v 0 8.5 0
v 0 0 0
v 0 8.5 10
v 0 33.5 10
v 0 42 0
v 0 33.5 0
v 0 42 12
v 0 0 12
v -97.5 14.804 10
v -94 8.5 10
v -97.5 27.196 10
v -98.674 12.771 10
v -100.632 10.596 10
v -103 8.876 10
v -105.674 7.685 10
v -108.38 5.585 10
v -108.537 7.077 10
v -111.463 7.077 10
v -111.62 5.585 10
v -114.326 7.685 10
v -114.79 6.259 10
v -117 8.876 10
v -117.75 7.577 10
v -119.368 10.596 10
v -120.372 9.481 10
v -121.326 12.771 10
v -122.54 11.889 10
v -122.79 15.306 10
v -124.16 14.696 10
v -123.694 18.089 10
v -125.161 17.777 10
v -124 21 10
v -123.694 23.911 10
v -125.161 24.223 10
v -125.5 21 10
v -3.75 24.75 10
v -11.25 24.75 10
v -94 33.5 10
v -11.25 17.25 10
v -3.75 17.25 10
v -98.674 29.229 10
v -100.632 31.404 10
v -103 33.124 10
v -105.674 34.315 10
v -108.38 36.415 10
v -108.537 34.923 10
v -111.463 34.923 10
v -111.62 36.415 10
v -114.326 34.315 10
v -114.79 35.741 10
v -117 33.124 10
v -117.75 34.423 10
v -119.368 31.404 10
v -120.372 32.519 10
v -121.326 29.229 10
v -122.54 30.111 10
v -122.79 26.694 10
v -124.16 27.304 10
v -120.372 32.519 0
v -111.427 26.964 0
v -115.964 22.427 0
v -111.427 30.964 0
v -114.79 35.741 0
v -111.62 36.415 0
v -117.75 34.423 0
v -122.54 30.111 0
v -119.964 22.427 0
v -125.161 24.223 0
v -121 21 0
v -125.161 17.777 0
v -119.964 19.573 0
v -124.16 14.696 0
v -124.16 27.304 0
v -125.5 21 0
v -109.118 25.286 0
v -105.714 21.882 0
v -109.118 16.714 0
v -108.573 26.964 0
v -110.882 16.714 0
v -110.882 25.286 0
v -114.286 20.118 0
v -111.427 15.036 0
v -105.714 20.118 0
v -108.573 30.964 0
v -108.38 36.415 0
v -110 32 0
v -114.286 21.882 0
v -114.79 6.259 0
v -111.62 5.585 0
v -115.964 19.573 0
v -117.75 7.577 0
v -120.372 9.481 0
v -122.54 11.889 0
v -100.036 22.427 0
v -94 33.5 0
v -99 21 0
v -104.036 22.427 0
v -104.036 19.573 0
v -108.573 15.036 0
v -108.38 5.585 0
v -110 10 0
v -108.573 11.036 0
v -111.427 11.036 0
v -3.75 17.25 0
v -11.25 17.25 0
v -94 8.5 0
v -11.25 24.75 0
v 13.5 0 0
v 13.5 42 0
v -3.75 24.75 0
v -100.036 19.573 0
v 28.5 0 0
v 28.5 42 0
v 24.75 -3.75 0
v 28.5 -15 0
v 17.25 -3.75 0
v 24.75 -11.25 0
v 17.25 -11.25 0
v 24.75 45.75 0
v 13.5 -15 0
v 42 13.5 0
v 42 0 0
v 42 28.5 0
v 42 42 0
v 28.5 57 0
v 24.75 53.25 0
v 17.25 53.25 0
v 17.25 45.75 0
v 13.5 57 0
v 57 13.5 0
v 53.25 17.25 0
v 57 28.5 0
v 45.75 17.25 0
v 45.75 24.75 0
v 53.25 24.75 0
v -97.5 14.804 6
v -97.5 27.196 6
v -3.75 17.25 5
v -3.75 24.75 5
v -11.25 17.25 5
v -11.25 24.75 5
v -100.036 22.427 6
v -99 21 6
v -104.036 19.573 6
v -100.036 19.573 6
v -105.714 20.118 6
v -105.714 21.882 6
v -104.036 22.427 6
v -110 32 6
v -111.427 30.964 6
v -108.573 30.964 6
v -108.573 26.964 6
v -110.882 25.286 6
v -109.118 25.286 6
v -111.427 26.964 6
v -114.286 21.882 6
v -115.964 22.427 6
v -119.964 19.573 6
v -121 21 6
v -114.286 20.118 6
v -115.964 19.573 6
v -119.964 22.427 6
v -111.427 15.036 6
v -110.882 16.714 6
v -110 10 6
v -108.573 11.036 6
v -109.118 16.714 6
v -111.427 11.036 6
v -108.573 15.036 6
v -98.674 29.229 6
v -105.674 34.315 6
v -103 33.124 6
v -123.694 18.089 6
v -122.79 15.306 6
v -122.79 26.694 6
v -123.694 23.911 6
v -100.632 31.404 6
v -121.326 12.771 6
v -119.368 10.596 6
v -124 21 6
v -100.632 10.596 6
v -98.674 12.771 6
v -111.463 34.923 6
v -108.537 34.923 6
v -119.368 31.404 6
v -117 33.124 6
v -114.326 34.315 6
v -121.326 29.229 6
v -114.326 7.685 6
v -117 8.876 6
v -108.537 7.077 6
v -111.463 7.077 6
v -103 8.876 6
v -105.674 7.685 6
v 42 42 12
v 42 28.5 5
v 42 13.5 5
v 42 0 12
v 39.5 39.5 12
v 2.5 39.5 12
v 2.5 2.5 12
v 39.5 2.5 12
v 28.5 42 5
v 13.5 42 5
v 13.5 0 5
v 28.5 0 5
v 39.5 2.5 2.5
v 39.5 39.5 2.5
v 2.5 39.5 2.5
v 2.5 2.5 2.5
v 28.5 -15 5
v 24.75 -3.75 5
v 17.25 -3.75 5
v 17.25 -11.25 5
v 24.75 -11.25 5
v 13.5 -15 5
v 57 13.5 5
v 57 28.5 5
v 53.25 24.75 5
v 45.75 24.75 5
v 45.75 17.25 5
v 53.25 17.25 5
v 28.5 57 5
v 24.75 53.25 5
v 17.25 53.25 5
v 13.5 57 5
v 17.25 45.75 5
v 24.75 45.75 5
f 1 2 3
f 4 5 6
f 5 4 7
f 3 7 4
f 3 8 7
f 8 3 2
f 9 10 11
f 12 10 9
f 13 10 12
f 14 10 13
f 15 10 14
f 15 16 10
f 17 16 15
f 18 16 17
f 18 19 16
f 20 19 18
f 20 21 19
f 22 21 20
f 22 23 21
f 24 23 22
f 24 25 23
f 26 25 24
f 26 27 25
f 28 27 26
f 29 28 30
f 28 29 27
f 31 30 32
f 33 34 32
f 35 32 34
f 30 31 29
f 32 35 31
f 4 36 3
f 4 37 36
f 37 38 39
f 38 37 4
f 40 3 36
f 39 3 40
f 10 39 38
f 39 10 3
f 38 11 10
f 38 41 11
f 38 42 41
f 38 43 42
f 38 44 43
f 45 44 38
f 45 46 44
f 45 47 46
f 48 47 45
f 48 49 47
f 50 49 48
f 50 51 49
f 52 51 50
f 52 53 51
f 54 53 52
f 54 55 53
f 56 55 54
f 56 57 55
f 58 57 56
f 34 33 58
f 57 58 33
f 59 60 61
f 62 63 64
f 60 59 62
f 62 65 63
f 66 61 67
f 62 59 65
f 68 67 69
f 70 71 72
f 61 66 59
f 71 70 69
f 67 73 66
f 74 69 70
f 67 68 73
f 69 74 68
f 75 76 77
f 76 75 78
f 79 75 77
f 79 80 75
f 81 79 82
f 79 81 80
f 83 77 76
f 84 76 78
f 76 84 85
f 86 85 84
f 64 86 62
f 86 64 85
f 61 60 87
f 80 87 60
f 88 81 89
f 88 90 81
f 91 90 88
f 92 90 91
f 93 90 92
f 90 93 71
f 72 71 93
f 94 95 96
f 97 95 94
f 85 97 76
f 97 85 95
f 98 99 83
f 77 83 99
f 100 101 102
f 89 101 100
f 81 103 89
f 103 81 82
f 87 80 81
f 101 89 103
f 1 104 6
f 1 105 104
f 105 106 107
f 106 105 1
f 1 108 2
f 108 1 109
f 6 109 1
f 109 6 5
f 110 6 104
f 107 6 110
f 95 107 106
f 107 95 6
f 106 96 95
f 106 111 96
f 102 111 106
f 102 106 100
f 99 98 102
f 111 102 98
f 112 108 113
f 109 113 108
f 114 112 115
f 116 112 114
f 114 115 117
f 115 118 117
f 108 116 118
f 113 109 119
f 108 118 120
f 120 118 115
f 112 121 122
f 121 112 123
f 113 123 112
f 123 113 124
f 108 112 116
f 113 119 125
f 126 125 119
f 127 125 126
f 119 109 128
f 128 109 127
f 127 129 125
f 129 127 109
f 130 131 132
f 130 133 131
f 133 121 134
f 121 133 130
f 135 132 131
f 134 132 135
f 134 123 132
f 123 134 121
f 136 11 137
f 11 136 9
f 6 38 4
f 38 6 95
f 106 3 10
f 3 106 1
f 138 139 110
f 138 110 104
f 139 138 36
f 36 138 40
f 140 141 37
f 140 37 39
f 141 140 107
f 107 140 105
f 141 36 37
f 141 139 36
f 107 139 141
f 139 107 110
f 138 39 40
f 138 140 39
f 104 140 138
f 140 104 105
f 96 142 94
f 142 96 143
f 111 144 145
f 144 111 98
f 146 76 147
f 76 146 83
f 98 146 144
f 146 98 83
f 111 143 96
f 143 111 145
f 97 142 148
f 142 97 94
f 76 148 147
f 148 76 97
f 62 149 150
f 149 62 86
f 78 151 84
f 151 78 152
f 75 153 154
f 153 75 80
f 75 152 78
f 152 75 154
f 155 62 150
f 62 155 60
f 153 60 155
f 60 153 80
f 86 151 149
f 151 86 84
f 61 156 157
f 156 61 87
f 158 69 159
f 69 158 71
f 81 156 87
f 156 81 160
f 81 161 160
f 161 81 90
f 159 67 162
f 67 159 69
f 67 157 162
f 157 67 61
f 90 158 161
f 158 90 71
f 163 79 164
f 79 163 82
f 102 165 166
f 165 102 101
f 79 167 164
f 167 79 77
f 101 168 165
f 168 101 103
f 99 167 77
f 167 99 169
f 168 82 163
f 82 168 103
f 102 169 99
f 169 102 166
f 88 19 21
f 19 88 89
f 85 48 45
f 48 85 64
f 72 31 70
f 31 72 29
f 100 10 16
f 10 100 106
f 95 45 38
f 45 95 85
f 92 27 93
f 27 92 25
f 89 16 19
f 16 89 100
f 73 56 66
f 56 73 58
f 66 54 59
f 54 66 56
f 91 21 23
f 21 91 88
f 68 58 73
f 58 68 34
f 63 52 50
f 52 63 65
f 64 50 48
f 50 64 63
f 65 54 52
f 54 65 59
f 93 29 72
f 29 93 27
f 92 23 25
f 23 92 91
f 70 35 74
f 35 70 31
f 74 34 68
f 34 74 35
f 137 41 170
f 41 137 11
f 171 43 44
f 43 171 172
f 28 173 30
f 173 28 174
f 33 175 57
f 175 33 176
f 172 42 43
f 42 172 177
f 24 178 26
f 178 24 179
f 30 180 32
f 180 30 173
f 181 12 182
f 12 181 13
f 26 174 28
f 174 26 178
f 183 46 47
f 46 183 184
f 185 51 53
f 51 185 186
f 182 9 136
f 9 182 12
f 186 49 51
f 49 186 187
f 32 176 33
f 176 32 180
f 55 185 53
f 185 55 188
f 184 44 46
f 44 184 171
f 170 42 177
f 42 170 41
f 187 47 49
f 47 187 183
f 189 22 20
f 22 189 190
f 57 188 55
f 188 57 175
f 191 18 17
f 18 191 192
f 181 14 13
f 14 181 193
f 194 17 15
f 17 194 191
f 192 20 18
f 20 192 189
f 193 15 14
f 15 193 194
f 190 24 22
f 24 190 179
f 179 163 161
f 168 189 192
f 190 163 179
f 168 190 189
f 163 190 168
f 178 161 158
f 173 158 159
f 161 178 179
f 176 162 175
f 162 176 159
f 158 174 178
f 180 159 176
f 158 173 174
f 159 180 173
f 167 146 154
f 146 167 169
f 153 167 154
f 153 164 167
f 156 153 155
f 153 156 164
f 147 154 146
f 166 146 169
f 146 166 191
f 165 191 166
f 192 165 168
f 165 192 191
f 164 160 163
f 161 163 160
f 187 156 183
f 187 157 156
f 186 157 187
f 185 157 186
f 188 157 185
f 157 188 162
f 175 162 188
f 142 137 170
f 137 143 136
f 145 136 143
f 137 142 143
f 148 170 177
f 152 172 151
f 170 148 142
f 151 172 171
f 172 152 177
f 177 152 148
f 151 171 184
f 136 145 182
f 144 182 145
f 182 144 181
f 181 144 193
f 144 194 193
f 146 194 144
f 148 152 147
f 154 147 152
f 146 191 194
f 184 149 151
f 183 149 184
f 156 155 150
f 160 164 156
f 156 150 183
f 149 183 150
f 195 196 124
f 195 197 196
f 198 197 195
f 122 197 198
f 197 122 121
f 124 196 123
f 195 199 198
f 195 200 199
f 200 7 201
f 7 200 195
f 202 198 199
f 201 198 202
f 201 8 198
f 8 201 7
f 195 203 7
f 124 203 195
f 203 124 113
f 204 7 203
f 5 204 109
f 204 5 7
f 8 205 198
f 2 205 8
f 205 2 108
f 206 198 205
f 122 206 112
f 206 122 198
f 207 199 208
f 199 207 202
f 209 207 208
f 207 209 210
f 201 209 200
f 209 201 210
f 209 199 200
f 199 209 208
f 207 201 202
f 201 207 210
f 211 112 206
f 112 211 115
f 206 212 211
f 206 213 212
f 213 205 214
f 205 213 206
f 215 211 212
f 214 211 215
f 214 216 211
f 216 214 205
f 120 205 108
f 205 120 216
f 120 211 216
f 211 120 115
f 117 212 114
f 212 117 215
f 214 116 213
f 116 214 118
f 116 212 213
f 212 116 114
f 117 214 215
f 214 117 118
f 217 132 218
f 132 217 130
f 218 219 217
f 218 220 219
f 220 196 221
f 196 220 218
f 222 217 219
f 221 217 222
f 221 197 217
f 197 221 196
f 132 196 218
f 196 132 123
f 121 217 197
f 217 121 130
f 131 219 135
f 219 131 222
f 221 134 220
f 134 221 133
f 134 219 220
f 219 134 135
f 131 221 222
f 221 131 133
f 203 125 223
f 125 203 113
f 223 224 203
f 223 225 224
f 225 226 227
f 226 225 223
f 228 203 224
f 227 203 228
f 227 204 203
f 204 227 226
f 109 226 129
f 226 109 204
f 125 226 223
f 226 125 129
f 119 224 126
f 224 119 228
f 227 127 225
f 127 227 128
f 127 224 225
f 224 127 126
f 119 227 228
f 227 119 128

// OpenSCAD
goodKKWid = 37;
holdWid = goodKKWid + 5;
kkWid = 50.5;
motorBoltSpace = 14;
armWid = 25;
armLength = 110-armWid/2;   // Distance to center of motor mount

module kk() {
	cube([goodKKWid,goodKKWid,12]);
}
module kkHold() {
	difference() {
		cube([holdWid,holdWid,12]);
		translate([2.5,2.5,2.5])kk();
	}
}

module attach(width,height) {
	difference() {
		translate([-width,0,0])cube([width,width,height]);
		translate([-(width/4)*3,width/4,-0.5])cube([width/2,width/2,height+1]);
	}
}

module main() {
	kkHold();
	translate([0,holdWid/2-7.5,0])attach(15,5);
	translate([holdWid/2+7.5,-15,0])attach(15,5);
	translate([holdWid+15,holdWid/2-7.5,0])attach(15,5);
	translate([holdWid/2+7.5,holdWid,0])attach(15,5);
}

armH = 10;
module arm() {
	difference() {
		translate([-armLength+armWid,0,0])cube([armLength,armWid,armH]);
		translate([armWid/2.5,armWid/5,-1])cube([16,15,6]);
		translate([13.75,35/4,-0.5])cube([15/2,15/2,15+1]);
	}
     translate([-armLength+armWid/2, armWid/2, 0]) motor_mount();
}


/*
    The motor mount. Cylinder with slots for the motor bolts. This 
    is done because the motor mounting holes are not on a square
*/
motorD = 28;
motorR = motorD/2;
holeR = 1.5;

module slot() {
    hull() {
        cylinder(r=holeR, h=100, center=true);
        translate([4,0,0]) cylinder(r=holeR, h=100, center=true);
    }
}

module motor_base() {
   hull() {
       cylinder(r = motorR+1.5, h=armH);
       translate([motorR+1, -armWid/2,0]) cube([1,armWid,armH]);
   }
}

module motor_mount() {
    difference() {
        motor_base();
        translate([0,0,6]) cylinder(r= motorR, h=7);
        for(angle = [0 : (360/4) : 360]) {
            rotate(angle) translate([5.5,0,0]) slot();
        }
    }
}

translate([-25,holdWid/2-12.5,0])arm();
main();
